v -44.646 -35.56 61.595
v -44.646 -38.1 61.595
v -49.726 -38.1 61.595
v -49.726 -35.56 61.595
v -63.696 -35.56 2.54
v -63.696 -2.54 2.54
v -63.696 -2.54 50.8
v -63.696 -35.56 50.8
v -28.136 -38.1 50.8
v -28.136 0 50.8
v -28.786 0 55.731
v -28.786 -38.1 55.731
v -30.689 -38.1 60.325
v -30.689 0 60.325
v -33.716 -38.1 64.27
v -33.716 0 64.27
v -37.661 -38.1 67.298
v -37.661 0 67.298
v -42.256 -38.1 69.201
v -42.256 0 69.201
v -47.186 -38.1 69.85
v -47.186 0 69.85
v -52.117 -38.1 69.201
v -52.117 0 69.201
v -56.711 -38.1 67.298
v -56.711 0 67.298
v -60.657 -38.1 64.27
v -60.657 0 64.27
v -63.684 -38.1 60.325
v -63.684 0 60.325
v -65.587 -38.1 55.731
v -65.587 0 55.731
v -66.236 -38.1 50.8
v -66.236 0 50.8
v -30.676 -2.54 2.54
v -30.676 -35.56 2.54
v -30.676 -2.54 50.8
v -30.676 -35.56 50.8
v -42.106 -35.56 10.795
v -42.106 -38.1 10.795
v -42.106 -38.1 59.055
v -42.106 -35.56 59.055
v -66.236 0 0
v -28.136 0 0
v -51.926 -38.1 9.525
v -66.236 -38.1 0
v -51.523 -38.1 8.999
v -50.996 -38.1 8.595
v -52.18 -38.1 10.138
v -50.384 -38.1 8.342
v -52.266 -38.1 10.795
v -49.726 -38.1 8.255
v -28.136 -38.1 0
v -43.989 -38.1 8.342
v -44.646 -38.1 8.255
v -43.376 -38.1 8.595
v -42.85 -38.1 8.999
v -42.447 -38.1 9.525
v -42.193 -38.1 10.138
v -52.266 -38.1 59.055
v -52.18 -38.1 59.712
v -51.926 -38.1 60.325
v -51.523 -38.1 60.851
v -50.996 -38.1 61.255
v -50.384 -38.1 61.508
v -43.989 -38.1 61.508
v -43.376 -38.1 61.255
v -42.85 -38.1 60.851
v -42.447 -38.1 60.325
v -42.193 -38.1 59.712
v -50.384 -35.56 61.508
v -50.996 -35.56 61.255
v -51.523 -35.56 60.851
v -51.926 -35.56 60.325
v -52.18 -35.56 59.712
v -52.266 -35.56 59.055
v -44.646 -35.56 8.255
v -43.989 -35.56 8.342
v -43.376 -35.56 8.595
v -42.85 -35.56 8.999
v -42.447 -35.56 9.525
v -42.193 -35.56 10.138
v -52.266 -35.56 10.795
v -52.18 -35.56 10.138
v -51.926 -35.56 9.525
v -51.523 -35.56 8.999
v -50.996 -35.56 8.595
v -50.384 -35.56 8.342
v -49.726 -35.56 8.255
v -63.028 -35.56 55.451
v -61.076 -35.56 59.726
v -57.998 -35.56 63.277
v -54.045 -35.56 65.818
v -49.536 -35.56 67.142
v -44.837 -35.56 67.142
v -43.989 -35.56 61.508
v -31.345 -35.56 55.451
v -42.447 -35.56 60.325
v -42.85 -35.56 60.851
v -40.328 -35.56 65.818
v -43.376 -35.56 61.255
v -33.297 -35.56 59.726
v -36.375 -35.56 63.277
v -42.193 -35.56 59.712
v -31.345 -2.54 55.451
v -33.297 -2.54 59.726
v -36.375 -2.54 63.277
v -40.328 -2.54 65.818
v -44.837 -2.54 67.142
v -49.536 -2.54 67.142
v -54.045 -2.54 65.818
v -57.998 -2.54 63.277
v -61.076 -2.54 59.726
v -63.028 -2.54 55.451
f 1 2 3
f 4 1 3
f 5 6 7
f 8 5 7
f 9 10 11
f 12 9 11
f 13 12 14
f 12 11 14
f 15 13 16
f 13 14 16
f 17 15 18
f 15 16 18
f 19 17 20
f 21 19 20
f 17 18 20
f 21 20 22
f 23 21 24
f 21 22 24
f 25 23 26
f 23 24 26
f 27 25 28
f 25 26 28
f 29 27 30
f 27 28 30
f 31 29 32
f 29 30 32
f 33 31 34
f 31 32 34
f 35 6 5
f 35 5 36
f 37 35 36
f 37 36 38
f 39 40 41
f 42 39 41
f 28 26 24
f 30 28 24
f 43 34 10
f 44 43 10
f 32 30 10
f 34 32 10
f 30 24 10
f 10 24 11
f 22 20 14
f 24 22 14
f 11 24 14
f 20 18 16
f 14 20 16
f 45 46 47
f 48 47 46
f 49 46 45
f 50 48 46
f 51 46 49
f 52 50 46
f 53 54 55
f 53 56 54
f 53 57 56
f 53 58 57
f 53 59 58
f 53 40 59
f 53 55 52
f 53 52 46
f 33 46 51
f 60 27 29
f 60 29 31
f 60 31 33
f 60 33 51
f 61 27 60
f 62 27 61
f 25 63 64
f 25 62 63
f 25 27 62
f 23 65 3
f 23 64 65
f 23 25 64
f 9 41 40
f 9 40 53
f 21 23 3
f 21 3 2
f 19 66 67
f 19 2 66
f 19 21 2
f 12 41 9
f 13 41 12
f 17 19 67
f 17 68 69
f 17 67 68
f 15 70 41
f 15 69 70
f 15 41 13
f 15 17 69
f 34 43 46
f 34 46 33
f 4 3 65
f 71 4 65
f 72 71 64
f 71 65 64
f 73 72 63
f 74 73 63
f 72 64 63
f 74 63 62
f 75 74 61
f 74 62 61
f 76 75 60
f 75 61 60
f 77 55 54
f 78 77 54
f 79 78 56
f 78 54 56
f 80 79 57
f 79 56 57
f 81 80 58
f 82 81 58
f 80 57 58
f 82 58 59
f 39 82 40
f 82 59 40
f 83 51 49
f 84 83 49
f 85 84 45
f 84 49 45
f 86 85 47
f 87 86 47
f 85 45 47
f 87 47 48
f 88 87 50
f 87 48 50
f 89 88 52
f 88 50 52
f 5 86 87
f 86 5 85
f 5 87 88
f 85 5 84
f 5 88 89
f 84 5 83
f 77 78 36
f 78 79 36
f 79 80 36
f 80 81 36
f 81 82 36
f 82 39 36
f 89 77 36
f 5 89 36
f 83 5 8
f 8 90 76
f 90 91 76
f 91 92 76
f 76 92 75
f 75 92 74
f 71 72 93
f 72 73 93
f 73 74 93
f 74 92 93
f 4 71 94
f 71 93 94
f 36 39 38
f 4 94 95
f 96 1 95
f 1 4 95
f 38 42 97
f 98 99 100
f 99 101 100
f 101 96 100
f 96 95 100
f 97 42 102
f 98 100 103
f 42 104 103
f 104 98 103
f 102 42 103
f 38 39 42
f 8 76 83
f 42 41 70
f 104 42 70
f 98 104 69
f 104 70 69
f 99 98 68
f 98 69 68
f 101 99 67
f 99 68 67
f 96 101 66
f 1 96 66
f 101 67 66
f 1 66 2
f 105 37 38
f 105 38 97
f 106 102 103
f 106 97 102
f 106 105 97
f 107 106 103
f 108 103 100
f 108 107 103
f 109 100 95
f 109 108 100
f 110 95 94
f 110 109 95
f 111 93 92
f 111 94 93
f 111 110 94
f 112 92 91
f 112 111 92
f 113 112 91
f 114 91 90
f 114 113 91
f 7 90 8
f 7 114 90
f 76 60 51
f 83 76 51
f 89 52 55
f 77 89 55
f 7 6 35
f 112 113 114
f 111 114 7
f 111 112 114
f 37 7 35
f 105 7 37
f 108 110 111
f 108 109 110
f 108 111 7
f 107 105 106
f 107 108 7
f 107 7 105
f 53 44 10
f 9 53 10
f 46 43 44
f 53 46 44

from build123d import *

# Parameters (mm, degrees)
F0_W     = 38.1
F0_H     = 50.8
F1_DEPTH = 38.1
F2_T     = -2.54
F4_DEPTH = 25.4


with BuildPart() as f1:
    # F0 (on Front) → F1 (new body)
    with BuildSketch(Plane.XZ):
        with Locations((-47.1864644898, 25.4)):
            Rectangle(F0_W, F0_H)
        with BuildLine():
            ThreePointArc((-28.1364644898, 50.8), (-47.1864644898, 69.85), (-66.2364644898, 50.8))
            Line((-66.2364644898, 50.8), (-28.1364644898, 50.8))
        make_face()
    extrude(amount=F1_DEPTH)

    # F2 (hollow: no face is removed)
    offset(amount=F2_T, mode=Mode.SUBTRACT)

    # F3 (on face) → F4 (cut)
    with BuildSketch(Plane.XZ.offset(38.1)):
        with BuildLine():
            ThreePointArc((-42.1064644898, 59.055), (-42.8504132656, 60.8510512242), (-44.6464644898, 61.595))
            Line((-44.6464644898, 61.595), (-49.7264644898, 61.595))
            ThreePointArc((-49.7264644898, 61.595), (-51.522515714, 60.8510512242), (-52.2664644898, 59.055))
            Line((-52.2664644898, 59.055), (-52.2664644898, 10.795))
            ThreePointArc((-52.2664644898, 10.795), (-51.522515714, 8.9989487758), (-49.7264644898, 8.255))
            Line((-49.7264644898, 8.255), (-44.6464644898, 8.255))
            ThreePointArc((-44.6464644898, 8.255), (-42.8504132656, 8.9989487758), (-42.1064644898, 10.795))
            Line((-42.1064644898, 10.795), (-42.1064644898, 59.055))
        make_face()
    extrude(amount=-F4_DEPTH, mode=Mode.SUBTRACT)


solid = f1.part
